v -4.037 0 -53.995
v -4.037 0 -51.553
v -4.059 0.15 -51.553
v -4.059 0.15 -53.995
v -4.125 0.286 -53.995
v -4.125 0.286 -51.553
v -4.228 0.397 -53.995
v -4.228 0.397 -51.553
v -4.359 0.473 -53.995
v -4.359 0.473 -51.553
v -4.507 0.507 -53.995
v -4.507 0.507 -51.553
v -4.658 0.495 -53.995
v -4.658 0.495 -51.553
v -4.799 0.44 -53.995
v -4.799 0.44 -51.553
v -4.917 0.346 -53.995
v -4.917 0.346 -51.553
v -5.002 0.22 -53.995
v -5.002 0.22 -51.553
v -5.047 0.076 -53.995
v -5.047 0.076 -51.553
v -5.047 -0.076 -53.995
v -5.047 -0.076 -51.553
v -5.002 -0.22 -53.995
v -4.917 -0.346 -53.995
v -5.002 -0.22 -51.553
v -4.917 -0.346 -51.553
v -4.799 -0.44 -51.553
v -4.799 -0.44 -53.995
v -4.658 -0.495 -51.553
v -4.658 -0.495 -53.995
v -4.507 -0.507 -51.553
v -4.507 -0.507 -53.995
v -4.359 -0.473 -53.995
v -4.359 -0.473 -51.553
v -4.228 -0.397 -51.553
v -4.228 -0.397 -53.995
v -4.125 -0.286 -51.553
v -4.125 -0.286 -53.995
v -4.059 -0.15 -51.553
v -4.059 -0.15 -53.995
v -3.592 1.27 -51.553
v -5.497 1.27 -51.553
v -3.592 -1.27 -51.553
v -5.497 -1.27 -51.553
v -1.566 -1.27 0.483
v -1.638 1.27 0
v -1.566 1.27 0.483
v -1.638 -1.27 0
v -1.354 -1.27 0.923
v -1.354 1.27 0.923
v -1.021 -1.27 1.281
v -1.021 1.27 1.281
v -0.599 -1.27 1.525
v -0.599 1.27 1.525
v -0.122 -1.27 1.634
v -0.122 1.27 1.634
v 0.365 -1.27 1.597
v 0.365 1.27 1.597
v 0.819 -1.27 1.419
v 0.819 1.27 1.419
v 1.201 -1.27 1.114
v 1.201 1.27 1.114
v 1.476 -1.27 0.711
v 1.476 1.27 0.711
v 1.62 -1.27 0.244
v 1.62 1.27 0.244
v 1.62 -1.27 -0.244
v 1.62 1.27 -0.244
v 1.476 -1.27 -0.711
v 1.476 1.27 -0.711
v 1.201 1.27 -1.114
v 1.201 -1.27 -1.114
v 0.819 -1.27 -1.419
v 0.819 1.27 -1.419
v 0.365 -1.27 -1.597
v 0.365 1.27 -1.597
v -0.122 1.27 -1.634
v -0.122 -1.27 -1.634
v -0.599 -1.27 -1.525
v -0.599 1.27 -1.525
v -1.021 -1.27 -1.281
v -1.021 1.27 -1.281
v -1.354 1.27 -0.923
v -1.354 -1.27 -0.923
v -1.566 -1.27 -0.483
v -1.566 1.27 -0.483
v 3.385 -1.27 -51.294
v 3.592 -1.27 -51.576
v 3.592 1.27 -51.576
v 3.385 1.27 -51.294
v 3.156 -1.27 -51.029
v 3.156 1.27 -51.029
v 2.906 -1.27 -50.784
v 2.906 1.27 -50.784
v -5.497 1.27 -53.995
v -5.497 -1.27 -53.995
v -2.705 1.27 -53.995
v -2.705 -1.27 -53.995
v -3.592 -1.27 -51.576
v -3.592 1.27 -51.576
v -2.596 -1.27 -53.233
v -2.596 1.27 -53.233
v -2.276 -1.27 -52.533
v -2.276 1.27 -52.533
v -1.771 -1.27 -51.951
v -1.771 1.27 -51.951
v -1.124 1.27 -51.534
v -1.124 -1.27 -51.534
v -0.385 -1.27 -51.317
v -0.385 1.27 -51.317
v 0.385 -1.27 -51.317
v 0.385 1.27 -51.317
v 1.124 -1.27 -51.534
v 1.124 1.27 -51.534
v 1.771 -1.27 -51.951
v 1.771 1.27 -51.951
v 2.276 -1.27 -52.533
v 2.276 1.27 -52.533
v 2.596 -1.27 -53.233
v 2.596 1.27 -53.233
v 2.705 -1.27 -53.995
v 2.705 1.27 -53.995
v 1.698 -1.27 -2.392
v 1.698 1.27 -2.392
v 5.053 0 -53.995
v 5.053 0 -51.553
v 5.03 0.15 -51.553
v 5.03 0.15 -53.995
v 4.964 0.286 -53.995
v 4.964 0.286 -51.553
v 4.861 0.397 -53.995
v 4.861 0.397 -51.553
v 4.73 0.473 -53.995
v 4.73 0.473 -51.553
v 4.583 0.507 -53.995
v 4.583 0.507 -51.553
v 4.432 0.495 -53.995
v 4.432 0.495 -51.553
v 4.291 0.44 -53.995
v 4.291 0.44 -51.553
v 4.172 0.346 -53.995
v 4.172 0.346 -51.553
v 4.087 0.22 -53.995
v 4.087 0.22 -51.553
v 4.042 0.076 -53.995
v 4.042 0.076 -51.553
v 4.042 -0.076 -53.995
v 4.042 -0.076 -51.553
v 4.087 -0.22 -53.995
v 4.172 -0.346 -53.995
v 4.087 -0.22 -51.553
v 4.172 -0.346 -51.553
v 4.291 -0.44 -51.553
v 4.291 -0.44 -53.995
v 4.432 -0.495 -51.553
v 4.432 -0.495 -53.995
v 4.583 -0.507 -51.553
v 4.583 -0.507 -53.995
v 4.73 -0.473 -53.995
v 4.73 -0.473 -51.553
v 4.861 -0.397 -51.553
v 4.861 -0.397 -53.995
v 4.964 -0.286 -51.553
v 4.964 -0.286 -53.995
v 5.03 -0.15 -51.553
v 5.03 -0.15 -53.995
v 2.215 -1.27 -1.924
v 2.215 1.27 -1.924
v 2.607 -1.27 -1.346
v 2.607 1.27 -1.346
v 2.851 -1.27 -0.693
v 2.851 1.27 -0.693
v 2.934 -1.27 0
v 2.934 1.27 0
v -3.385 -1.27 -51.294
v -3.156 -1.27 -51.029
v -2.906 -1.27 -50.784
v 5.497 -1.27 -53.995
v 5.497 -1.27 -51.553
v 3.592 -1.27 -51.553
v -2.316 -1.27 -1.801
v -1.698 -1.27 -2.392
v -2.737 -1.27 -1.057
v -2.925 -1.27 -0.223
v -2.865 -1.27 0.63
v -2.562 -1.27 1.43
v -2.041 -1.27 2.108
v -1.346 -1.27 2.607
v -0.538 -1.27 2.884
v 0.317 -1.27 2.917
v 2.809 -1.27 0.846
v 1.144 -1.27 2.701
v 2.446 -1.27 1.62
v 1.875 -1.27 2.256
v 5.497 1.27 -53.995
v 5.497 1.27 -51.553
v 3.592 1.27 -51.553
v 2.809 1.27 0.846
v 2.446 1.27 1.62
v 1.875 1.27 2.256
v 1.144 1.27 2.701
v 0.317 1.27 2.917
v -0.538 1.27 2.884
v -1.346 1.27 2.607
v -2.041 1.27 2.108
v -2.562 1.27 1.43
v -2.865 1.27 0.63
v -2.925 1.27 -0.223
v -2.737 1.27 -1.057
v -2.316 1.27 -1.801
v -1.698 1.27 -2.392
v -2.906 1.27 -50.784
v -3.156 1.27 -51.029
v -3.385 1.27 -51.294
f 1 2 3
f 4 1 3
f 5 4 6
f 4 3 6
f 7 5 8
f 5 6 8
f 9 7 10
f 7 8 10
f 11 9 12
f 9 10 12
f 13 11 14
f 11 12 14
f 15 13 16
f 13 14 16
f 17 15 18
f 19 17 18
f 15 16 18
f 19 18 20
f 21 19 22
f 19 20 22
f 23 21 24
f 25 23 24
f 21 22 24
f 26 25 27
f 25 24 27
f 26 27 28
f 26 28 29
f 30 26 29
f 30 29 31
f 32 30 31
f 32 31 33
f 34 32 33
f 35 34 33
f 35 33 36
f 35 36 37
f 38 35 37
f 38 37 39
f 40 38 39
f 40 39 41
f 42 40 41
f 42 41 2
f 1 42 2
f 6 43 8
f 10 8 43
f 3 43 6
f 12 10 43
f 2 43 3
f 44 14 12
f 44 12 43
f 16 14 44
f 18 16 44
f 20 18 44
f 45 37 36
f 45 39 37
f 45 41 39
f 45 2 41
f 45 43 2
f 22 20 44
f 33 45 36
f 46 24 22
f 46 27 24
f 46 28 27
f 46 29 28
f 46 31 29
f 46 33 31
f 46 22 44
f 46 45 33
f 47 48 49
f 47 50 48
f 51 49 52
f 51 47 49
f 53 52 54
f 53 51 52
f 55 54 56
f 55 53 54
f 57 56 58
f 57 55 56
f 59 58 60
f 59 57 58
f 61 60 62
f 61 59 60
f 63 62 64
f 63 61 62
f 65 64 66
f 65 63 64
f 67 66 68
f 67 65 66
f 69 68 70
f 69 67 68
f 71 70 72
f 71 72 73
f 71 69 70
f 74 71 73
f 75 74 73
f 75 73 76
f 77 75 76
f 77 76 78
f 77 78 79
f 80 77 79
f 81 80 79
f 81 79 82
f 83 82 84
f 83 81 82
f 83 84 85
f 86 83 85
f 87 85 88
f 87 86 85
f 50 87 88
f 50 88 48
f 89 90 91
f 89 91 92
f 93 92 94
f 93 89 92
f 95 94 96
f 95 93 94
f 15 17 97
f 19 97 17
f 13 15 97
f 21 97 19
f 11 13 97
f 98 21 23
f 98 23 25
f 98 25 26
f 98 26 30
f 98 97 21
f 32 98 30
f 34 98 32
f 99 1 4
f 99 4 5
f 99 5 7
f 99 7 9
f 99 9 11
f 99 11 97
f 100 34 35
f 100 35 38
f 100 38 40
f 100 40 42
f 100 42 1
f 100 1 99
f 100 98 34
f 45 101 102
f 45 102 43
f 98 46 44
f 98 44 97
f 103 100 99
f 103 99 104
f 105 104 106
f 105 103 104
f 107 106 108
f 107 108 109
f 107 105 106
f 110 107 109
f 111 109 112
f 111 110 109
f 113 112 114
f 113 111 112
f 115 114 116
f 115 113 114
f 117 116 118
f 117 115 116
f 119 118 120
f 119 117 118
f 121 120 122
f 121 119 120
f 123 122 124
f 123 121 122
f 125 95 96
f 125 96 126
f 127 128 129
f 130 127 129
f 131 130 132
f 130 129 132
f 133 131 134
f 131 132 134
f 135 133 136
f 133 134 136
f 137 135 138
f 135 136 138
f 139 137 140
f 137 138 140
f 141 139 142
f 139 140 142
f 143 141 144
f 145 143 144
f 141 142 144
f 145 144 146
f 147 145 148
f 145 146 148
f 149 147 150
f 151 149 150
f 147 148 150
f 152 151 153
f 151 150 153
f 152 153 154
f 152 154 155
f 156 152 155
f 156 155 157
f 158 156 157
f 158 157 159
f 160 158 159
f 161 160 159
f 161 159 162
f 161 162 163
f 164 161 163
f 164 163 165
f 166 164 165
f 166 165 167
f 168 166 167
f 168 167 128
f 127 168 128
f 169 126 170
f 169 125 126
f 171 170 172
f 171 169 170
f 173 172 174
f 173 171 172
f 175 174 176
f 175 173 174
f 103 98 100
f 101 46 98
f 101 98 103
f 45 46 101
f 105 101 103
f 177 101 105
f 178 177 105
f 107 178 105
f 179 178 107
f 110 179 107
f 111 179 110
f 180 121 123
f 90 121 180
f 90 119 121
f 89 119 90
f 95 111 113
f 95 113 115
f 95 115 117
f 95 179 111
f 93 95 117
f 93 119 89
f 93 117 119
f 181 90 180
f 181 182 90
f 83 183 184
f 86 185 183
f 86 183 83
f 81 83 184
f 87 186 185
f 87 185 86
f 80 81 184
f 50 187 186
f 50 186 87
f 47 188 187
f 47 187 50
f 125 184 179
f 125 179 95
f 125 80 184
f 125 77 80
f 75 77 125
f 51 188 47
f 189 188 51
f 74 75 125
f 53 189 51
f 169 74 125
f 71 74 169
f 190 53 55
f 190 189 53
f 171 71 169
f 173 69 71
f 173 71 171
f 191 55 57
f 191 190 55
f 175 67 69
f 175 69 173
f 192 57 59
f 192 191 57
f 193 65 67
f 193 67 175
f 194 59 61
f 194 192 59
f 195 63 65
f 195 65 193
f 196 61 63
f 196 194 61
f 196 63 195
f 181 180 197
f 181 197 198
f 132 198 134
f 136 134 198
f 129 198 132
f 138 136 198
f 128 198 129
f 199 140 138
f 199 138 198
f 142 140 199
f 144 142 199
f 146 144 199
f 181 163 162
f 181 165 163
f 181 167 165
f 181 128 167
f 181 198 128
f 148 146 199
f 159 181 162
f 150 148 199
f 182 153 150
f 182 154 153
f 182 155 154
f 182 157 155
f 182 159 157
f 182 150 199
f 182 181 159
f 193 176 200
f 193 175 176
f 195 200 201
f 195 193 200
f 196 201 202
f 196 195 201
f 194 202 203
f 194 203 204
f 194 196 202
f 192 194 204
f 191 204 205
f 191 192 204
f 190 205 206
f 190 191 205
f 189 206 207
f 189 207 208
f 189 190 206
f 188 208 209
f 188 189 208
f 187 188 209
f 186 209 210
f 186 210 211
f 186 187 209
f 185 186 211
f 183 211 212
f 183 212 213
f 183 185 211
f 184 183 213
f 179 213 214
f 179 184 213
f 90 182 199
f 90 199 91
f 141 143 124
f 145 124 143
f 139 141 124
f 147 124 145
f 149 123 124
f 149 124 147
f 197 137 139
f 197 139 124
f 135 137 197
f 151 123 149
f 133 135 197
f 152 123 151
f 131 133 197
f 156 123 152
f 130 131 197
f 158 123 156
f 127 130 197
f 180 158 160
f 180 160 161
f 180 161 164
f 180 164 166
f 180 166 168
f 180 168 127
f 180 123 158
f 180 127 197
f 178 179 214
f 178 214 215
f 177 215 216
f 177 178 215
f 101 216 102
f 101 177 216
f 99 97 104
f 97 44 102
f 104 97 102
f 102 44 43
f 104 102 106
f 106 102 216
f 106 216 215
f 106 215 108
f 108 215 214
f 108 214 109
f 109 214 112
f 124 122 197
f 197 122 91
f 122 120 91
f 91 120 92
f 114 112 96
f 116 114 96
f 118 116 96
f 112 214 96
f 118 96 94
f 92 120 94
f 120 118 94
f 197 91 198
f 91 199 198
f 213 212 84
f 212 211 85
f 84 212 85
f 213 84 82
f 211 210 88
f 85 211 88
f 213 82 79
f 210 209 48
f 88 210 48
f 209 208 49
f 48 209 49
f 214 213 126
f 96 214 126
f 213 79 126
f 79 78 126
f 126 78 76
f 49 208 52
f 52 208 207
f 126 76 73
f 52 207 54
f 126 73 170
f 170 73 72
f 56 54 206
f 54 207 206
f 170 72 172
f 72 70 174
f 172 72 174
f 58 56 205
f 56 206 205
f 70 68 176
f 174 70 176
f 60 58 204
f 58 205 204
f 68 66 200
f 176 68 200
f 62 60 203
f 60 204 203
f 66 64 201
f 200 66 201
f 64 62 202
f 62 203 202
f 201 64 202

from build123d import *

# Parameters (mm, degrees)
F1_DEPTH = 1.27
F2_DEPTH = 1.27
F3_R     = 0.508
F4_R     = 0.508
F5_DEPTH = 25.4


with BuildPart() as f1:
    # F0 (on Front) → F1 (new body, symmetric)
    with BuildSketch(Plane.XZ):
        with BuildLine():
            ThreePointArc((1.6980241155, -2.3923439956), (0, -2.9337), (-1.6980241155, -2.3923439956))
            Line((-1.6980241155, -2.3923439956), (-2.906111014, -50.7841772133))
            ThreePointArc((-2.906111014, -50.7841772133), (0, -49.6643153071), (2.906111014, -50.7841772133))
            Line((2.906111014, -50.7841772133), (1.6980241155, -2.3923439956))
        make_face()
        with BuildLine():
            ThreePointArc((1.6980241155, -2.3923439956), (2.6065388006, -1.3463102061), (2.9337, 0))
            ThreePointArc((2.9337, 0), (-1.3463102061, 2.6065388006), (-1.6980241155, -2.3923439956))
            Line((-1.6980241155, -2.3923439956), (-1.6383, 0))
            ThreePointArc((-1.6383, 0), (0, 1.6383), (1.6383, 0))
            Line((1.6383, 0), (1.6980241155, -2.3923439956))
        make_face()
        with BuildLine():
            Line((-1.6383, 0), (-1.6980241155, -2.3923439956))
            ThreePointArc((-1.6980241155, -2.3923439956), (0, -2.9337), (1.6980241155, -2.3923439956))
            Line((1.6980241155, -2.3923439956), (1.6383, 0))
            ThreePointArc((1.6383, 0), (0, -1.6383), (-1.6383, 0))
        make_face()
        with BuildLine():
            ThreePointArc((2.906111014, -50.7841772133), (0, -49.6643153071), (-2.906111014, -50.7841772133))
            ThreePointArc((-2.906111014, -50.7841772133), (-3.273195149, -51.1593220926), (-3.5922005773, -51.5761193807))
            Line((-3.5922005773, -51.5761193807), (-3.5922005773, -53.9950153071))
            Line((-3.5922005773, -53.9950153071), (-2.7051, -53.9950153071))
            ThreePointArc((-2.7051, -53.9950153071), (0, -51.2899153071), (2.7051, -53.9950153071))
            Line((2.7051, -53.9950153071), (3.5922005773, -53.9950153071))
            Line((3.5922005773, -53.9950153071), (3.5922005773, -51.5761193807))
            ThreePointArc((3.5922005773, -51.5761193807), (3.273195149, -51.1593220926), (2.906111014, -50.7841772133))
        make_face()
        with BuildLine():
            ThreePointArc((4.3307, -53.9950153071), (4.1419624292, -52.7304562041), (3.5922005773, -51.5761193807))
            Line((3.5922005773, -51.5761193807), (3.5922005773, -53.9950153071))
            Line((3.5922005773, -53.9950153071), (4.3307, -53.9950153071))
        make_face()
        with BuildLine():
            Line((3.5922005773, -51.5533201396), (3.5922005773, -51.5761193807))
            ThreePointArc((3.5922005773, -51.5761193807), (4.1419624292, -52.7304562041), (4.3307, -53.9950153071))
            Line((4.3307, -53.9950153071), (5.4972005773, -53.9950153071))
            Line((5.4972005773, -53.9950153071), (5.4972005773, -51.5533201396))
            Line((5.4972005773, -51.5533201396), (3.5922005773, -51.5533201396))
        make_face()
        with BuildLine():
            Line((-3.5922005773, -53.9950153071), (-3.5922005773, -51.5761193807))
            ThreePointArc((-3.5922005773, -51.5761193807), (-4.1419624292, -52.7304562041), (-4.3307, -53.9950153071))
            Line((-4.3307, -53.9950153071), (-3.5922005773, -53.9950153071))
        make_face()
        with BuildLine():
            ThreePointArc((-4.3307, -53.9950153071), (-4.1419624292, -52.7304562041), (-3.5922005773, -51.5761193807))
            Line((-3.5922005773, -51.5761193807), (-3.5922005773, -51.5533201396))
            Line((-3.5922005773, -51.5533201396), (-5.4972005773, -51.5533201396))
            Line((-5.4972005773, -51.5533201396), (-5.4972005773, -53.9950153071))
            Line((-5.4972005773, -53.9950153071), (-4.3307, -53.9950153071))
        make_face()
    extrude(amount=F1_DEPTH, both=True)

    # F0 (on Front) → F2 (join, symmetric)
    with BuildSketch(Plane.XZ):
        with BuildLine():
            ThreePointArc((1.6980241155, -2.3923439956), (0, -2.9337), (-1.6980241155, -2.3923439956))
            Line((-1.6980241155, -2.3923439956), (-2.906111014, -50.7841772133))
            ThreePointArc((-2.906111014, -50.7841772133), (0, -49.6643153071), (2.906111014, -50.7841772133))
            Line((2.906111014, -50.7841772133), (1.6980241155, -2.3923439956))
        make_face()
        with BuildLine():
            ThreePointArc((1.6980241155, -2.3923439956), (2.6065388006, -1.3463102061), (2.9337, 0))
            ThreePointArc((2.9337, 0), (-1.3463102061, 2.6065388006), (-1.6980241155, -2.3923439956))
            Line((-1.6980241155, -2.3923439956), (-1.6383, 0))
            ThreePointArc((-1.6383, 0), (0, 1.6383), (1.6383, 0))
            Line((1.6383, 0), (1.6980241155, -2.3923439956))
        make_face()
        with BuildLine():
            Line((-1.6383, 0), (-1.6980241155, -2.3923439956))
            ThreePointArc((-1.6980241155, -2.3923439956), (0, -2.9337), (1.6980241155, -2.3923439956))
            Line((1.6980241155, -2.3923439956), (1.6383, 0))
            ThreePointArc((1.6383, 0), (0, -1.6383), (-1.6383, 0))
        make_face()
        with BuildLine():
            ThreePointArc((2.906111014, -50.7841772133), (0, -49.6643153071), (-2.906111014, -50.7841772133))
            ThreePointArc((-2.906111014, -50.7841772133), (-3.273195149, -51.1593220926), (-3.5922005773, -51.5761193807))
            Line((-3.5922005773, -51.5761193807), (-3.5922005773, -53.9950153071))
            Line((-3.5922005773, -53.9950153071), (-2.7051, -53.9950153071))
            ThreePointArc((-2.7051, -53.9950153071), (0, -51.2899153071), (2.7051, -53.9950153071))
            Line((2.7051, -53.9950153071), (3.5922005773, -53.9950153071))
            Line((3.5922005773, -53.9950153071), (3.5922005773, -51.5761193807))
            ThreePointArc((3.5922005773, -51.5761193807), (3.273195149, -51.1593220926), (2.906111014, -50.7841772133))
        make_face()
    extrude(amount=F2_DEPTH, both=True)

    # F3 (on face) + F4 (on face) → F5 (cut)
    with BuildSketch(Plane.XY.offset(-51.5533201396)):
        with Locations((-4.5447005773, 0)):
            Circle(F3_R)
    with BuildSketch(Plane.XY.offset(-51.5533201396)):
        with Locations((4.5447005773, 0)):
            Circle(F4_R)
    extrude(amount=-F5_DEPTH, mode=Mode.SUBTRACT)


solid = f1.part
